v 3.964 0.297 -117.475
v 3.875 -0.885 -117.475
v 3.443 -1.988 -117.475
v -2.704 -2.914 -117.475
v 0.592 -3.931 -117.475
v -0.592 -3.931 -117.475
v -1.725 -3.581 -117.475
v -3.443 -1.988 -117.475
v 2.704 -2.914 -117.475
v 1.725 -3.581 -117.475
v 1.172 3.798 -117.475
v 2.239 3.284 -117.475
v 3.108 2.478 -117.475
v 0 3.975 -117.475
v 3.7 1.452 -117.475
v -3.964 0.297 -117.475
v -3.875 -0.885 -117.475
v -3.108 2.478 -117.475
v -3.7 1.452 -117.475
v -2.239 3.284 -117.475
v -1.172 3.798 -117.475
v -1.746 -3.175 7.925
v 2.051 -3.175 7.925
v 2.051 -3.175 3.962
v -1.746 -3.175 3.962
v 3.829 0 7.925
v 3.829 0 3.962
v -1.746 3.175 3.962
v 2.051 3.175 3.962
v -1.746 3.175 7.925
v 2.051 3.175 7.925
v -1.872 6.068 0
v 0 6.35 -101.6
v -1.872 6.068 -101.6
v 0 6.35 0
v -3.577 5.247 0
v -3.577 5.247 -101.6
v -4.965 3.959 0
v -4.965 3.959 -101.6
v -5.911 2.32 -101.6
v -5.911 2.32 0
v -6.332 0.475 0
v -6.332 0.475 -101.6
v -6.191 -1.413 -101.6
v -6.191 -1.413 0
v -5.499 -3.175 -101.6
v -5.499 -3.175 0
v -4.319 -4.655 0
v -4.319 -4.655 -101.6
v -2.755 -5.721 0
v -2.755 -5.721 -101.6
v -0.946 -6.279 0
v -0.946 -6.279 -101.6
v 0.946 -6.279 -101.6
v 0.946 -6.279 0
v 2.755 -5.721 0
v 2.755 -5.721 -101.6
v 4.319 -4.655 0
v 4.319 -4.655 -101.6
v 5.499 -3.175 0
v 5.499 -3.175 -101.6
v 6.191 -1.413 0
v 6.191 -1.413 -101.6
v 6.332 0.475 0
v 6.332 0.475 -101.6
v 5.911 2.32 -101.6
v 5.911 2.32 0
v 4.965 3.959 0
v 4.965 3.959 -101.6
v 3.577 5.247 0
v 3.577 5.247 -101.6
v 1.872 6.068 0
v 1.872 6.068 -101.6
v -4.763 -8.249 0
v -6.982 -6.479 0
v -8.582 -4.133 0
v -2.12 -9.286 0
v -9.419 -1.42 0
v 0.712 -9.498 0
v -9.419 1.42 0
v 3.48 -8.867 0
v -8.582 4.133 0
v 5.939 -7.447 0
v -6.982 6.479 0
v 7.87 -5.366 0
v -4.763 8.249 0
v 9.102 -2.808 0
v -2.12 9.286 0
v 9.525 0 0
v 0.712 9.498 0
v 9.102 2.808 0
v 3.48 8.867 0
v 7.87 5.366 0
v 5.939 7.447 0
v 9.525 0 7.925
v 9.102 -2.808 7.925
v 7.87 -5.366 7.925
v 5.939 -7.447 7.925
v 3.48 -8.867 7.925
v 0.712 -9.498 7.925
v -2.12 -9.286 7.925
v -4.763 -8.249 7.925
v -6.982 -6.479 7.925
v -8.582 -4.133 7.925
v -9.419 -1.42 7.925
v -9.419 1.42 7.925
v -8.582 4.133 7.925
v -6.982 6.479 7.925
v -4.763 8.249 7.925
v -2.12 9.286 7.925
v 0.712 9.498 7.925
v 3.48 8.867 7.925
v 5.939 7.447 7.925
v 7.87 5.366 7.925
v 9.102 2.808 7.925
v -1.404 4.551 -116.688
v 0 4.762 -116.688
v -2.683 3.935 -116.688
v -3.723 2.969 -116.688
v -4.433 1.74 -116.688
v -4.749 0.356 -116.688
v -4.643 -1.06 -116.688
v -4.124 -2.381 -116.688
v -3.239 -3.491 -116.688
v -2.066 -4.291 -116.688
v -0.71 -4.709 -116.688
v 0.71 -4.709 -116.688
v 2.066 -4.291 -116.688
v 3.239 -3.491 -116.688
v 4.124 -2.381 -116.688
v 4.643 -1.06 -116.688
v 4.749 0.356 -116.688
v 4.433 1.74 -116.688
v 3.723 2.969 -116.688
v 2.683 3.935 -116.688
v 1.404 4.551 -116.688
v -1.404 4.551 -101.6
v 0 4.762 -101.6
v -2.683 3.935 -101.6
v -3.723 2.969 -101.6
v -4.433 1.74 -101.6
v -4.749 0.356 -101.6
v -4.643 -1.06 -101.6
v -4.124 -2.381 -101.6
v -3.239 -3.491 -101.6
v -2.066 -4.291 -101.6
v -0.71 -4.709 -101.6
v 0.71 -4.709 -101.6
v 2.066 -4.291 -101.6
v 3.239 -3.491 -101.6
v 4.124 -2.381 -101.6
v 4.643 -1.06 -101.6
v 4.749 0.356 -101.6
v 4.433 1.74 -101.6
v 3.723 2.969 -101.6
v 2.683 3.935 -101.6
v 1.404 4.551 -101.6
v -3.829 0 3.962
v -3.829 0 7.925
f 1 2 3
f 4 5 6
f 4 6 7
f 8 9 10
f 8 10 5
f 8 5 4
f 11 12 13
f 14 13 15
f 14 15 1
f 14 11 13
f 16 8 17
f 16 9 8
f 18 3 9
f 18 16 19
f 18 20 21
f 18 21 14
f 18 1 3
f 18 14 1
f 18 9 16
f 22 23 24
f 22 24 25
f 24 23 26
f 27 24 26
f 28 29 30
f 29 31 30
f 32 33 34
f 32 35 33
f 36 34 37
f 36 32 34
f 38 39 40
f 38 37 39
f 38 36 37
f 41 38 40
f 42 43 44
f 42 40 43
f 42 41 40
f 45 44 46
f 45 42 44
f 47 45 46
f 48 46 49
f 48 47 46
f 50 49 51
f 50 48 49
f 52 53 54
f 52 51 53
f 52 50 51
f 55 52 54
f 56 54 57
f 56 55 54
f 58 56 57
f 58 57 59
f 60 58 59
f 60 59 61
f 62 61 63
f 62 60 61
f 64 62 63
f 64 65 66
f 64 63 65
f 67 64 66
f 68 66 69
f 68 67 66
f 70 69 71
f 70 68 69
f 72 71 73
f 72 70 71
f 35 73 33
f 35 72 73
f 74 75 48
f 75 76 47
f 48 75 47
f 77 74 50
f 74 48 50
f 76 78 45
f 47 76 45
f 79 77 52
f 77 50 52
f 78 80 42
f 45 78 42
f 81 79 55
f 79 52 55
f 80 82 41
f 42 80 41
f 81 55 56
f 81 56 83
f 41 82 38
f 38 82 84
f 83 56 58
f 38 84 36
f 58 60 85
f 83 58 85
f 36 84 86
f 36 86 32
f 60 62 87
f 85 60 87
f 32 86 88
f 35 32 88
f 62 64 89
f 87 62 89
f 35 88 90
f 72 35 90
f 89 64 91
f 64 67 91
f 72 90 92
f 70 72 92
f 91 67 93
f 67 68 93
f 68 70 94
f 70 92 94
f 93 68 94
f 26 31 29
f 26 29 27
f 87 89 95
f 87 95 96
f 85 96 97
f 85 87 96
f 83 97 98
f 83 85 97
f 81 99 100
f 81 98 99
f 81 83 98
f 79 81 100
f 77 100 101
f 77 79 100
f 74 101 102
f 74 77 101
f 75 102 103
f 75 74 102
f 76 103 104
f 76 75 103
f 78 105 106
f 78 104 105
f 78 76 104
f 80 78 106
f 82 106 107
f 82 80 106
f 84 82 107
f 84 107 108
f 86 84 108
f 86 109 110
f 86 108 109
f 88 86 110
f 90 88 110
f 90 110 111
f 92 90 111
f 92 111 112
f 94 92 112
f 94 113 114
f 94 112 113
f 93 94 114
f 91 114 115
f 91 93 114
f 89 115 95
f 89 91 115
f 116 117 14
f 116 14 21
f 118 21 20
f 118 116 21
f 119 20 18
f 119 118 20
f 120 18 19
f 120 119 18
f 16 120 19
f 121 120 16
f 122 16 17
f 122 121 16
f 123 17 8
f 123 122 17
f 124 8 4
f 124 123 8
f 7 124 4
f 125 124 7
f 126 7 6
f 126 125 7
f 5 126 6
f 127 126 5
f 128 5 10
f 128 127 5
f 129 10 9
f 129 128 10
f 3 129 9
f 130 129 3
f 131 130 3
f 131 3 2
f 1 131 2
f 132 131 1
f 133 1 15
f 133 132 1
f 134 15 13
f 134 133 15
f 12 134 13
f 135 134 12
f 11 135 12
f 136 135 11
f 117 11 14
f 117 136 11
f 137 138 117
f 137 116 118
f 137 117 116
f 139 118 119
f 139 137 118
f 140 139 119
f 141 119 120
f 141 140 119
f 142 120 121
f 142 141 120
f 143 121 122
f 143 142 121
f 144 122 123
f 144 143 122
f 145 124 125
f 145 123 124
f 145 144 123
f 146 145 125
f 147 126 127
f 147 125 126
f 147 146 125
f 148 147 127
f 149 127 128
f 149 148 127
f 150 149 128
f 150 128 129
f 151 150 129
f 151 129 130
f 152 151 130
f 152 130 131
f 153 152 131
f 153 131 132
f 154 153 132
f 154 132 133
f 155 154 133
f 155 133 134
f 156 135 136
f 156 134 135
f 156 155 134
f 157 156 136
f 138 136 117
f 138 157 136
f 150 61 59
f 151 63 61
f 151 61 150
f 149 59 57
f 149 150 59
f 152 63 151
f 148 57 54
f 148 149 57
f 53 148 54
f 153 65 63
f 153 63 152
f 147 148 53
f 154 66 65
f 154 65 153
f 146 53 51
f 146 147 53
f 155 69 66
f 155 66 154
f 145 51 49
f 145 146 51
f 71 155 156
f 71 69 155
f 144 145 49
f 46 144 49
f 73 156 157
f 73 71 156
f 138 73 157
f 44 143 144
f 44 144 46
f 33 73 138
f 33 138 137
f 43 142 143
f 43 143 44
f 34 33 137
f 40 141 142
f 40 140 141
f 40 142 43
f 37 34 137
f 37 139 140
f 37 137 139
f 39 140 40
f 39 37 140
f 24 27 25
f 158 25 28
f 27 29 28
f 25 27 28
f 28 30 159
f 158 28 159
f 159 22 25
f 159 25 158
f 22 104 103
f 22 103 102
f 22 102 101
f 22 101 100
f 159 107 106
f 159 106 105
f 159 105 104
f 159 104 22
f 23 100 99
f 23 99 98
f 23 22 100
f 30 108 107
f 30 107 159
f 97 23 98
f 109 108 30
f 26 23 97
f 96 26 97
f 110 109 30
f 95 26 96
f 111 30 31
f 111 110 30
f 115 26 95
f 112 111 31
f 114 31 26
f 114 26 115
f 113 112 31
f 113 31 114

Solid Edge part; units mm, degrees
sketch "Sketch1" plane through (0, 0, 0) normal (0, 0, 1) x (1, 0, 0)
  circle A0 centre (0, 0) radius 9.525
  dimension "D1" = 19.05
extrude "Protrusion1" add sketch "Sketch1" along normal blind 7.9248
sketch "Sketch2" plane through (0, 0, 0) normal (0, 0, -1) x (0, 1, 0)
  circle A0 centre (0, 0) radius 6.35
  dimension "D1" = 12.7
extrude "Protrusion2" add sketch "Sketch2" along normal blind 101.6
sketch "Sketch3" plane through (0, 0, -101.6) normal (0, 0, -1) x (0, 1, 0)
  circle A0 centre (0, 0) radius 4.7625
  dimension "D1" = 9.525
extrude "Protrusion3" add sketch "Sketch3" along normal blind 15.875
sketch "Sketch4" plane through (0, 0, 7.9248) normal (0, 0, 1) x (0, 1, 0)
  line L0 (-3.175, 1.7461) -> (0, 3.8287)
  line L1 (-3.175, -2.051) -> (-3.175, 1.7461)
  line L2 (-3.175, -2.051) -> (0, -3.8287)
  line L3 (3.175, -2.051) -> (0, -3.8287)
  line L4 (3.175, -2.051) -> (3.175, 1.7461)
  line L5 (3.175, 1.7461) -> (0, 3.8287)
  dimension "D1" = 6.35
extrude "Cutout1" cut sketch "Sketch4" against normal blind 3.9624
chamfer "Chamfer1" distance 0.7874 angle 45 1 edges at (0, -4.7625, -117.475)
properties part number "144841"
